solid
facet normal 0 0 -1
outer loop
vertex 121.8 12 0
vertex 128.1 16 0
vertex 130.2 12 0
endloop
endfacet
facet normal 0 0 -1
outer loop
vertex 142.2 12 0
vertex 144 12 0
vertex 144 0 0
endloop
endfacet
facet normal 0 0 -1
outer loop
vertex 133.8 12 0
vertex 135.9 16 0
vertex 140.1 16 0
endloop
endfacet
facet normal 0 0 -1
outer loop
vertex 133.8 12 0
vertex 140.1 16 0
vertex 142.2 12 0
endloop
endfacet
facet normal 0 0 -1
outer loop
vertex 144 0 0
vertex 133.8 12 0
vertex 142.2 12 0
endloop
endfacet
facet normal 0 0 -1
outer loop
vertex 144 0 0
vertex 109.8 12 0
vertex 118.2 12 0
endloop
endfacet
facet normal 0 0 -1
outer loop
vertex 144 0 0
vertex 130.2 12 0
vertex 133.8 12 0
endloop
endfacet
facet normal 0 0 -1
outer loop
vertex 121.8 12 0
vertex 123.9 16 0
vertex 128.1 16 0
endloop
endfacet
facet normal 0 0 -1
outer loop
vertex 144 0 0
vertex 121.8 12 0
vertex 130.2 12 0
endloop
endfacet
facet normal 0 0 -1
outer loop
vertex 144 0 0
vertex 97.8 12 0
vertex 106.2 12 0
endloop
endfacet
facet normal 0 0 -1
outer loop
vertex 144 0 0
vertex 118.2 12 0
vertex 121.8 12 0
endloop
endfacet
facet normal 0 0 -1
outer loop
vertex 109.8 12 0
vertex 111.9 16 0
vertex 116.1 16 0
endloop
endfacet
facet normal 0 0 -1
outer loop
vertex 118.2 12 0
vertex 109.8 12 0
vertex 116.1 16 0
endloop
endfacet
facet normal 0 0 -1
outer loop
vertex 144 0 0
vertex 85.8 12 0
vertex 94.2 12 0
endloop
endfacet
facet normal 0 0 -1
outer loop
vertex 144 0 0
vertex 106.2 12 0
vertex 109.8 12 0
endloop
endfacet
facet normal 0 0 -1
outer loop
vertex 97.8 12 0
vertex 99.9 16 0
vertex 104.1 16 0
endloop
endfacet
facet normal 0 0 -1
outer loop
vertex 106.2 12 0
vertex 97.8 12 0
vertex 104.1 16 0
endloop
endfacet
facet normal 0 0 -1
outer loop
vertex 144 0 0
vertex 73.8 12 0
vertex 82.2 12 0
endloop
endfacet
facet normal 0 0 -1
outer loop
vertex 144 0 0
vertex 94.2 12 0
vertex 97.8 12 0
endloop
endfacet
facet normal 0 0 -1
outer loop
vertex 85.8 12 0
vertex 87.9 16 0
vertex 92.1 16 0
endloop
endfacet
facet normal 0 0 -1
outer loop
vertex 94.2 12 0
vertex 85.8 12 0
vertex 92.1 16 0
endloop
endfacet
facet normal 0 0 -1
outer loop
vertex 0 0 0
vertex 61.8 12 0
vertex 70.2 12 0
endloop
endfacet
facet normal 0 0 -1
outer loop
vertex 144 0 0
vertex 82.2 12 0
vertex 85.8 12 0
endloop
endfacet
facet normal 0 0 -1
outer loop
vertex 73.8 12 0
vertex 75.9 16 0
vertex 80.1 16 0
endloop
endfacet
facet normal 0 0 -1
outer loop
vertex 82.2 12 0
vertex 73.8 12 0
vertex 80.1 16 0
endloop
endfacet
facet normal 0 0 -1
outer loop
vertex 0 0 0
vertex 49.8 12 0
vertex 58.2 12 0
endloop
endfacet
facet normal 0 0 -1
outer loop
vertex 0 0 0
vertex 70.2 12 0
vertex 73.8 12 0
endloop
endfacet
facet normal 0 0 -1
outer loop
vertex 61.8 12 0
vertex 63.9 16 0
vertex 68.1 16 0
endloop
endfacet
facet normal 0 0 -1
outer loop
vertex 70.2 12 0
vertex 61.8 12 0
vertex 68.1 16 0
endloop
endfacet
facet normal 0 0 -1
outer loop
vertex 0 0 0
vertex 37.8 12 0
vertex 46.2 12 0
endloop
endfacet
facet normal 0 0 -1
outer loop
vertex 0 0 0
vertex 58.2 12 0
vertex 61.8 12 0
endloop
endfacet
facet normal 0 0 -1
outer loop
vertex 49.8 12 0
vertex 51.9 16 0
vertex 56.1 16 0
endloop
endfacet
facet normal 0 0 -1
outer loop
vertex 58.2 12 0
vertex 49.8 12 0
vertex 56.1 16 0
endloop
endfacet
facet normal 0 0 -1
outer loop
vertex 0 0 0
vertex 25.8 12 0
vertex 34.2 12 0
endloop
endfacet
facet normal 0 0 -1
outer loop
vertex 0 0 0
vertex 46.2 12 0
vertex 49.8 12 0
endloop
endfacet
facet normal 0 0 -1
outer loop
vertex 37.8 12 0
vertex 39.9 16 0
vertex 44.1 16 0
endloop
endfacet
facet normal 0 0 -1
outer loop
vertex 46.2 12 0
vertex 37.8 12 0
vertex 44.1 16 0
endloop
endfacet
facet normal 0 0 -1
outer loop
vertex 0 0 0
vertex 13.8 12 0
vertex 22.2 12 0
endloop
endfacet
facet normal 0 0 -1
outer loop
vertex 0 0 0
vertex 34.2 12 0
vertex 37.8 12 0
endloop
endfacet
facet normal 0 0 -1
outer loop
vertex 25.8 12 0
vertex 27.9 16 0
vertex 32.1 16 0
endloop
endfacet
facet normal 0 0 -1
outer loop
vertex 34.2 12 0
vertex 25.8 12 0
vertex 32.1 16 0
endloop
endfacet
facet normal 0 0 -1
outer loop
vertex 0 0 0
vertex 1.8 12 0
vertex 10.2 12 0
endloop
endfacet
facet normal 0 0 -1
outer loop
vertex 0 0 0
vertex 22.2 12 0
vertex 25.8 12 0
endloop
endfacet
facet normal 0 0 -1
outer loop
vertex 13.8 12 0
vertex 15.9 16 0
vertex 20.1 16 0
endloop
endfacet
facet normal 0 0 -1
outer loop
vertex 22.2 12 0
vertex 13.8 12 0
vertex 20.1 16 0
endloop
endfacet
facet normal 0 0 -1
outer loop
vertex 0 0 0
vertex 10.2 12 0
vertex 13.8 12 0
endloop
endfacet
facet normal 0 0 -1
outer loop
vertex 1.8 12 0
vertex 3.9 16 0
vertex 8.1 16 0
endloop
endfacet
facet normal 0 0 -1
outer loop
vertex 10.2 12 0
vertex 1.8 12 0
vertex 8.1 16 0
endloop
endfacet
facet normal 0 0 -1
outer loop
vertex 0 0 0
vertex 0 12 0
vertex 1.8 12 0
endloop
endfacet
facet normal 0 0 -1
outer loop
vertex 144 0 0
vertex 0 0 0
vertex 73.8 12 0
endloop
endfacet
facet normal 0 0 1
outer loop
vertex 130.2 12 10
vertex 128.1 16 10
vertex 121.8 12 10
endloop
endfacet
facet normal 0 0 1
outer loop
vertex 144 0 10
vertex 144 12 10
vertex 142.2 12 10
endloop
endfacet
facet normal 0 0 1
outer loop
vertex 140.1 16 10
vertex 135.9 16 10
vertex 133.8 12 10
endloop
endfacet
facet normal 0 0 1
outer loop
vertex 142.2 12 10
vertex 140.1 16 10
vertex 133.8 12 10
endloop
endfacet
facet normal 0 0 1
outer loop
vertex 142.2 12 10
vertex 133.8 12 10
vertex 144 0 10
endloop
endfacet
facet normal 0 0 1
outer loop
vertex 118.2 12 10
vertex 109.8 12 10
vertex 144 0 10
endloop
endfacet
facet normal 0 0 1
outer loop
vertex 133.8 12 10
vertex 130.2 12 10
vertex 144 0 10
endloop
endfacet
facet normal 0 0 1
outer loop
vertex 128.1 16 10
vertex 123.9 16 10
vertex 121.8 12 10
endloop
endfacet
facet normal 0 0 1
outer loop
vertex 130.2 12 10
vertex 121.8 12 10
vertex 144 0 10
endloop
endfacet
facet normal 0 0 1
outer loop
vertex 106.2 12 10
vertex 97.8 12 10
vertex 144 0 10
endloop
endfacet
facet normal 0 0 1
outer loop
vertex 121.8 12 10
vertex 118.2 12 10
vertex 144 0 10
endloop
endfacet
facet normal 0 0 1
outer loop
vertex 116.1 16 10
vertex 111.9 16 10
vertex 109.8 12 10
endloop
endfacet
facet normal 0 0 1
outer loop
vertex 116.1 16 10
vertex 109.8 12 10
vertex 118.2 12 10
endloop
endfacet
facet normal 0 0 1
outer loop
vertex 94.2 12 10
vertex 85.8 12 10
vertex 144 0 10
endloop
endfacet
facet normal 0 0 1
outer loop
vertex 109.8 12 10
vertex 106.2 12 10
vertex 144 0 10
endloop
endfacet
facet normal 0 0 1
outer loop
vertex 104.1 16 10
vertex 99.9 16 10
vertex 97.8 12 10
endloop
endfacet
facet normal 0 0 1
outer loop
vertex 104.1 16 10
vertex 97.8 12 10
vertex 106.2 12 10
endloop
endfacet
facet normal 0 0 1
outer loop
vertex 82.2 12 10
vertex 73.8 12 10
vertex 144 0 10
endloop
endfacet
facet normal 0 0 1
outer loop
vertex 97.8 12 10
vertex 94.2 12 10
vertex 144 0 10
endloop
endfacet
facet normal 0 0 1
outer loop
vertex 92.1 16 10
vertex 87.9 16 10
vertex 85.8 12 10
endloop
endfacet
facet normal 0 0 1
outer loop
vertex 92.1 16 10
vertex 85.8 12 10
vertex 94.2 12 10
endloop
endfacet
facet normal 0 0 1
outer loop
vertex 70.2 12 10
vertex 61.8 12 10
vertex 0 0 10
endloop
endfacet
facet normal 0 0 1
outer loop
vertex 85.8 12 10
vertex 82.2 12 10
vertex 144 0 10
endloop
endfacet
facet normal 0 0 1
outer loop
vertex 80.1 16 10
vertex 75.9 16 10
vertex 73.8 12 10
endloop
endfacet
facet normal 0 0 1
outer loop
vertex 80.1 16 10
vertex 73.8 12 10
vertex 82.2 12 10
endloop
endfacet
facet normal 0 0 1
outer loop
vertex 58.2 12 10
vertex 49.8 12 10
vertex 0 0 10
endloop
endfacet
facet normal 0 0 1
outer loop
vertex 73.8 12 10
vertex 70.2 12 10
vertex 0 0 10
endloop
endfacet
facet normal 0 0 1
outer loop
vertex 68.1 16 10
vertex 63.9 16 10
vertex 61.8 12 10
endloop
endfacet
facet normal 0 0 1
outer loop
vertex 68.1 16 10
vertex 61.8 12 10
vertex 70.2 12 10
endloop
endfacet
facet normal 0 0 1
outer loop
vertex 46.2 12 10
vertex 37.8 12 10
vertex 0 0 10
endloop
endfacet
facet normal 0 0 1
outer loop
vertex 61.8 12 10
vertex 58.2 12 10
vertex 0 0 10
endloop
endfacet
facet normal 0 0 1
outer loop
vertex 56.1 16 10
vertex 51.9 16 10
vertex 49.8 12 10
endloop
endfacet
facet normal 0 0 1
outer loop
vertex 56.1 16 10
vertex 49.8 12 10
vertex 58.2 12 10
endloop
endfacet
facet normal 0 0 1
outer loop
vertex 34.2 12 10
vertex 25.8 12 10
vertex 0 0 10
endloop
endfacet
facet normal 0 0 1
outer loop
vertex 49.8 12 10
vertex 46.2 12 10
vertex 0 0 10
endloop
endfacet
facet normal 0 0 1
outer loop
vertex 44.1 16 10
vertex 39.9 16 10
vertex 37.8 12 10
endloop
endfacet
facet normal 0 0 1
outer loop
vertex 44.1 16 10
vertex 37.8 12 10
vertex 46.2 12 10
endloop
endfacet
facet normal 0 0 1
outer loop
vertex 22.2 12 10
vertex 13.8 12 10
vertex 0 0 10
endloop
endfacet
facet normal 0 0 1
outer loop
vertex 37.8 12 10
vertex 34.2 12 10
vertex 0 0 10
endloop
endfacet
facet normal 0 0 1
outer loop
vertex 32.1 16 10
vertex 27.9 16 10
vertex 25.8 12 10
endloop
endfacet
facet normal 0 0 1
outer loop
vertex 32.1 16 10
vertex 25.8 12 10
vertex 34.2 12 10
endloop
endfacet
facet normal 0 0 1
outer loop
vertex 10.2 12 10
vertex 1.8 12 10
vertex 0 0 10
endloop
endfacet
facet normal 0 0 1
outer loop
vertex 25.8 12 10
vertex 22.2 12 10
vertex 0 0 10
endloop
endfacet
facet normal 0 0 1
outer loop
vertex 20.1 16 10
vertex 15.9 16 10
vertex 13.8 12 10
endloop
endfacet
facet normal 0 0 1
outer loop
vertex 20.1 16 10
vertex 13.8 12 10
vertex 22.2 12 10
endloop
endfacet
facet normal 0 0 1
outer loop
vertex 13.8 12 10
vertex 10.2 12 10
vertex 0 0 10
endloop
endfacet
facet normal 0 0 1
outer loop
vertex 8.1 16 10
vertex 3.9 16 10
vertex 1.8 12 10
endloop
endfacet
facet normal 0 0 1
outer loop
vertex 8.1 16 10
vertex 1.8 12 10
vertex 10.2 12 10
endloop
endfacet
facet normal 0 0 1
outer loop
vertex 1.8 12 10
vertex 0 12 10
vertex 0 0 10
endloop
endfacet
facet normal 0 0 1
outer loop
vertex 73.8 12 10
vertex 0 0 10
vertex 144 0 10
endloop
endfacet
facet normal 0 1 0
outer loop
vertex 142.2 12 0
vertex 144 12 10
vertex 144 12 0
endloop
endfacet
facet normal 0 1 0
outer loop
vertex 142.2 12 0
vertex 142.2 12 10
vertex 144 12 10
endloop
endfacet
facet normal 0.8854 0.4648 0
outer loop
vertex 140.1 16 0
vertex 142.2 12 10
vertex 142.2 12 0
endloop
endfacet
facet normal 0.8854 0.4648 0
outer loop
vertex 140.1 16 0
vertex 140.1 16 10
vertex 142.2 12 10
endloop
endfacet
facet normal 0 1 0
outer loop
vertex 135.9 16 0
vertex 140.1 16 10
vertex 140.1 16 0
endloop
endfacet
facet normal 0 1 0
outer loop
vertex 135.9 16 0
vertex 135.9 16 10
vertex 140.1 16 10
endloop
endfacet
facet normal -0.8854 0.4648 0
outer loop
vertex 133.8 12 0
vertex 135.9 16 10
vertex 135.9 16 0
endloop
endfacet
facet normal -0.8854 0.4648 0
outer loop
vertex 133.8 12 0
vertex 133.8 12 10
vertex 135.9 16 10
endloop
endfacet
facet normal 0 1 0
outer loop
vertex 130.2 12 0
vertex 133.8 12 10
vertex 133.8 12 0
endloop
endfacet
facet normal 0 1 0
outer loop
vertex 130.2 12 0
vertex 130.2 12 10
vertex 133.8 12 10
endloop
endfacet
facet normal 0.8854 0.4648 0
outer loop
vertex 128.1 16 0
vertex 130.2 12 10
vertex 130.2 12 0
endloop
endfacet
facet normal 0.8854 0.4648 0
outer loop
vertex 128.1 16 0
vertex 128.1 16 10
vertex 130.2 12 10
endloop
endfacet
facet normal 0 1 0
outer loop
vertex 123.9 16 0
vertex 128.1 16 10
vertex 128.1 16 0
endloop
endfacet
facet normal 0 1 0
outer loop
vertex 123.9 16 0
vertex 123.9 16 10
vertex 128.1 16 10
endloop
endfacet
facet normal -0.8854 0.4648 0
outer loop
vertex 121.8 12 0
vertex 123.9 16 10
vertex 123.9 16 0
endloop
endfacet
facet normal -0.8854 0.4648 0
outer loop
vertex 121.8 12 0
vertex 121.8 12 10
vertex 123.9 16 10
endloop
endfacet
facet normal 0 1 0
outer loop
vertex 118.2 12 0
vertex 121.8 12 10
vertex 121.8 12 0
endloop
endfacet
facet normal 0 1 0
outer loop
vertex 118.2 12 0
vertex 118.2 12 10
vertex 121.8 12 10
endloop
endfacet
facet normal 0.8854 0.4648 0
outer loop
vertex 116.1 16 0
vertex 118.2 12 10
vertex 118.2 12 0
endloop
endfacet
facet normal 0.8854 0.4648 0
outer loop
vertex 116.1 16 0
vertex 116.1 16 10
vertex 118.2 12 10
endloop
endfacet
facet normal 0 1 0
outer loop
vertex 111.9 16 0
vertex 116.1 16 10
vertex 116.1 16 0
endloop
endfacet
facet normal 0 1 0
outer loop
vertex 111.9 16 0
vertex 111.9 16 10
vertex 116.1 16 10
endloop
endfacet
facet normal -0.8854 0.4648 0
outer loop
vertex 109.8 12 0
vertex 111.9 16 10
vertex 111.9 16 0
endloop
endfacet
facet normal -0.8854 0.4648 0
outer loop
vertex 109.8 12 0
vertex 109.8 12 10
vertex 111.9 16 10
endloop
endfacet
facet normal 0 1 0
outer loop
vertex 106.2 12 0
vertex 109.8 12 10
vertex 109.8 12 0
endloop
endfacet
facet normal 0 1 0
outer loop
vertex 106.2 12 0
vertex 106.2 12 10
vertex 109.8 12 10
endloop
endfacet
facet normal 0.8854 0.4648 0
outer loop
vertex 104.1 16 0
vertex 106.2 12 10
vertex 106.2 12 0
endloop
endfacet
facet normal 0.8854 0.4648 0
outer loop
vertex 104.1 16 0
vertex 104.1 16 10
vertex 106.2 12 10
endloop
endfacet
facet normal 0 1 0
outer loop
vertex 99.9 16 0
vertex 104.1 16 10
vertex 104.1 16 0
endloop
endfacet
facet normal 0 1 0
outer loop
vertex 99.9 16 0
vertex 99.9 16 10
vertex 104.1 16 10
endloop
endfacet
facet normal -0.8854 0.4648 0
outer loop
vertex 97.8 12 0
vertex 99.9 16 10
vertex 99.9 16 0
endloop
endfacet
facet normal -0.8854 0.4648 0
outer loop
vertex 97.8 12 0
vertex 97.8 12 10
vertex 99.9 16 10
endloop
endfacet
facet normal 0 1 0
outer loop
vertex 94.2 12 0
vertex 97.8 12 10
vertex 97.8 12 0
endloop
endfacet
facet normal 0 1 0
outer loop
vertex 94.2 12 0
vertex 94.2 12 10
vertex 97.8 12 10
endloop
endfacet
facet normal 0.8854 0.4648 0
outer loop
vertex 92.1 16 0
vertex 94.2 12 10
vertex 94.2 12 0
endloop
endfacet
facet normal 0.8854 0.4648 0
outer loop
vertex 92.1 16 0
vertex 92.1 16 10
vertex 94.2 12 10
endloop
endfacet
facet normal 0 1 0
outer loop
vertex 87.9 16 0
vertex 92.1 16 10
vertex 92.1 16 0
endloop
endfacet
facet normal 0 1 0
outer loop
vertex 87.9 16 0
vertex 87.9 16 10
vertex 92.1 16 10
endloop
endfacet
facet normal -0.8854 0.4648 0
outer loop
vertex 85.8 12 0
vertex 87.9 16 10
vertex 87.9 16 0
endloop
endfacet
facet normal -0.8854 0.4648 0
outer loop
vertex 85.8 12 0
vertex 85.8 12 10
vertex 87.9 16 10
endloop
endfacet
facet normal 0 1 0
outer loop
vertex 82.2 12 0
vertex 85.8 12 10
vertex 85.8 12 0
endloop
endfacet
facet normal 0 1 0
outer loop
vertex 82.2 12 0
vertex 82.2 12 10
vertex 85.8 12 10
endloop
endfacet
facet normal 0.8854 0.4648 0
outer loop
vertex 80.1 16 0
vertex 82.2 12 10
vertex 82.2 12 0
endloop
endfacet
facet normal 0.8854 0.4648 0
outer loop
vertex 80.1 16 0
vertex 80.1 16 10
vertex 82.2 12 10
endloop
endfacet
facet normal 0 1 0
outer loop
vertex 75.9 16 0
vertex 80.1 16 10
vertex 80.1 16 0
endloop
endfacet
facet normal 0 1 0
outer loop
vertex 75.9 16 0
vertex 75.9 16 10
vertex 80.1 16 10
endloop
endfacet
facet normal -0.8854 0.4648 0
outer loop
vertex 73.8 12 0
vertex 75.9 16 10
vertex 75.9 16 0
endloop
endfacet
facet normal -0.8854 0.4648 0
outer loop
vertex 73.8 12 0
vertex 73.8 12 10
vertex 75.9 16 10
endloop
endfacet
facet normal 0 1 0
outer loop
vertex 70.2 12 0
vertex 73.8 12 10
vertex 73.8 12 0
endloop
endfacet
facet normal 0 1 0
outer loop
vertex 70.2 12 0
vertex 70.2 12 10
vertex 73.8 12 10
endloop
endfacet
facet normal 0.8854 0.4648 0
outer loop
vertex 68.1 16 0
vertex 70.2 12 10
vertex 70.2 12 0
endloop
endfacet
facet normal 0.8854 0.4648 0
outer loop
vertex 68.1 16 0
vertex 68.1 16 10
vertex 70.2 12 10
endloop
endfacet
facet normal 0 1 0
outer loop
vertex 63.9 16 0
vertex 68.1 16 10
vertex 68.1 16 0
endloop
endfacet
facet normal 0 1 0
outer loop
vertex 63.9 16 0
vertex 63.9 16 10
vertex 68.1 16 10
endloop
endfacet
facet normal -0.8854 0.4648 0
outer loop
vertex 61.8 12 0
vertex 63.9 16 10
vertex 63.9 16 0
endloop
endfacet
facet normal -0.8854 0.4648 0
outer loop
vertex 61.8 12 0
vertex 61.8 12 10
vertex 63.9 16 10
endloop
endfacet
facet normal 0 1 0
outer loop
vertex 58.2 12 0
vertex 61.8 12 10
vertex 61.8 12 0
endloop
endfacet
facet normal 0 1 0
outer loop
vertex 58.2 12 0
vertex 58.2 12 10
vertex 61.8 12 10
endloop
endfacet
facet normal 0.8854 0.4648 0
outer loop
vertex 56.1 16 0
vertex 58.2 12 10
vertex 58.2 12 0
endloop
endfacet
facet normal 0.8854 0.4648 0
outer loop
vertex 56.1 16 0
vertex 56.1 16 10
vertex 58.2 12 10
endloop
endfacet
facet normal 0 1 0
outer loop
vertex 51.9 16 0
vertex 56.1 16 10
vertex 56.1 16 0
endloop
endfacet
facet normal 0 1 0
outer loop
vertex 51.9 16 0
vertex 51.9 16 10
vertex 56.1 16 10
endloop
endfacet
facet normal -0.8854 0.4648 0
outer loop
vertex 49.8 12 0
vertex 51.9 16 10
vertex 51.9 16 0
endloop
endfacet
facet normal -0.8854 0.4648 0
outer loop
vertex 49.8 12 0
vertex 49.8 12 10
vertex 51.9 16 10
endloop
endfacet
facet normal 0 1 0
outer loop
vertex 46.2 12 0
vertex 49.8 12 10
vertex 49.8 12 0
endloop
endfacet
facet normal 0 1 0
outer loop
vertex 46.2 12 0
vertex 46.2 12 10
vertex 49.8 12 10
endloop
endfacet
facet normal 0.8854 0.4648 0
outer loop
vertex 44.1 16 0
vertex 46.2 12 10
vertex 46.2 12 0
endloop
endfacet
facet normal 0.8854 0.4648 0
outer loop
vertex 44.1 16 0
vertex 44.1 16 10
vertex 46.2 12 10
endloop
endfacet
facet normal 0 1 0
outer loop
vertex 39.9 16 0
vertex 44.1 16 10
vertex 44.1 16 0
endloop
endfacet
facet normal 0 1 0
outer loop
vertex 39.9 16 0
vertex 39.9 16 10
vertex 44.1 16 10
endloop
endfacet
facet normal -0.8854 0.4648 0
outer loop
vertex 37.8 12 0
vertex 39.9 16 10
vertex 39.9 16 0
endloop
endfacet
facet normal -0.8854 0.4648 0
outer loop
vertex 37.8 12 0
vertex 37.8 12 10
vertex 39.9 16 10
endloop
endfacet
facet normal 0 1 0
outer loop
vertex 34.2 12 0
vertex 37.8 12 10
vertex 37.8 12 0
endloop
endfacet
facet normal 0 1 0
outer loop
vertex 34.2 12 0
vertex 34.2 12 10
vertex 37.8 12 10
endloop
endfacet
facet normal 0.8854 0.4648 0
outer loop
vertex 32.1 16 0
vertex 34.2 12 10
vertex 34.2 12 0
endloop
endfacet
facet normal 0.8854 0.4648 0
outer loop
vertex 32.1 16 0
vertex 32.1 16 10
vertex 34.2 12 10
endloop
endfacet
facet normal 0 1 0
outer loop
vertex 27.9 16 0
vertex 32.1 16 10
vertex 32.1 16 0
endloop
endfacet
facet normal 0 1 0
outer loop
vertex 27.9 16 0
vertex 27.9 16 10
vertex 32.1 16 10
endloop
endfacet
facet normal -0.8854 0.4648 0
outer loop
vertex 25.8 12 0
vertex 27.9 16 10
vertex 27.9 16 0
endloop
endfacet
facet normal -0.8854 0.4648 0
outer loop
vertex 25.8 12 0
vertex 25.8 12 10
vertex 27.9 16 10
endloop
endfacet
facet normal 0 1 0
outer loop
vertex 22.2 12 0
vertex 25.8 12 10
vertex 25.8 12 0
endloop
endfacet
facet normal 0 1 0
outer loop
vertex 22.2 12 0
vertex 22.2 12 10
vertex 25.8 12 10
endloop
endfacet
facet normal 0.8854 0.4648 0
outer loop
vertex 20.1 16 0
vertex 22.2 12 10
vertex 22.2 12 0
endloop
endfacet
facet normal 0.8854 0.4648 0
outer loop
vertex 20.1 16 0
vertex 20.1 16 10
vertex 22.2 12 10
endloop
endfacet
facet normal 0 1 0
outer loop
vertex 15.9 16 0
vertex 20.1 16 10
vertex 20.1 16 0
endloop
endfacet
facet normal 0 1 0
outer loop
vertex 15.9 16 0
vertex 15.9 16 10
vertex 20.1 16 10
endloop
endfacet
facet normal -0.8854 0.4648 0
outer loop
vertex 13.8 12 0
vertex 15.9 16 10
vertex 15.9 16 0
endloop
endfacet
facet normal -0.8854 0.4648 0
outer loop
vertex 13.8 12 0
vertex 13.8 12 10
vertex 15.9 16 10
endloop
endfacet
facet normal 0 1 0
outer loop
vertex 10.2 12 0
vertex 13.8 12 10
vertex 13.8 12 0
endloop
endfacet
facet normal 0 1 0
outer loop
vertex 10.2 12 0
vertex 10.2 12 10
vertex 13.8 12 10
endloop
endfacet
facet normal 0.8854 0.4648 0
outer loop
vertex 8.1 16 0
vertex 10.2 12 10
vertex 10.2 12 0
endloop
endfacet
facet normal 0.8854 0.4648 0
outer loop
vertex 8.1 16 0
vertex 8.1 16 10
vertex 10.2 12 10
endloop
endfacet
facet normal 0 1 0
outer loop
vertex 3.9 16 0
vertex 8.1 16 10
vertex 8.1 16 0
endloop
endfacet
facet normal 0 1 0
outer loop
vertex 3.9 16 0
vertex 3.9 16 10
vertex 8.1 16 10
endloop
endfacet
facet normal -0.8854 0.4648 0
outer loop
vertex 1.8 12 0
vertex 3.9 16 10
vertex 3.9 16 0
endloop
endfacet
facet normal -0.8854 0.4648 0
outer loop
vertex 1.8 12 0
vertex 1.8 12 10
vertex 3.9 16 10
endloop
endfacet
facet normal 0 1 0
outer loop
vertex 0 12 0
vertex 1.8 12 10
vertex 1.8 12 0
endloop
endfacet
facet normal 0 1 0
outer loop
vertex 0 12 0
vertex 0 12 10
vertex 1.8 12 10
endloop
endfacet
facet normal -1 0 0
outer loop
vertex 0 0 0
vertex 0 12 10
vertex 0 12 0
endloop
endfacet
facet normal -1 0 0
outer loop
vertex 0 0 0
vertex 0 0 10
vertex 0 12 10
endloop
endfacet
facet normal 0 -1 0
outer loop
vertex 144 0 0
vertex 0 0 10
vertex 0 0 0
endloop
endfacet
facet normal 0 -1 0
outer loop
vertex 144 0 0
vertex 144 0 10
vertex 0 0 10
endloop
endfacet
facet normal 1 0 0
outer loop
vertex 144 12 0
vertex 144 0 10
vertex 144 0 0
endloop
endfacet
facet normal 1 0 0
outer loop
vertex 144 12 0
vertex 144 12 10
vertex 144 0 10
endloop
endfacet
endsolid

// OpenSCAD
$fn = 32;

// ----------------------------------------------------------------------
// Gear rack: 12 teeth, pitch 12 mm
// ----------------------------------------------------------------------

// --- parameters (mm) ---
teeth = 12;               // number of teeth
pitch = 12;               // tooth pitch, X
root_w = 8.4;             // tooth width at the root
tip_w = 4.2;              // tooth width at the tip
base_h = 12;              // rack body height, Y
tooth_h = 4;              // tooth height above the body
plate_t = 10;             // rack width, Z (extrusion height)

rack_l = teeth * pitch;  // overall length
total_h = base_h + tooth_h;  // overall height

profile = [[0, 0], [144, 0], [144, 12], [142.2, 12], [140.1, 16], [135.9, 16], [133.8, 12], [130.2, 12], [128.1, 16], [123.9, 16], [121.8, 12], [118.2, 12], [116.1, 16], [111.9, 16], [109.8, 12], [106.2, 12], [104.1, 16], [99.9, 16], [97.8, 12], [94.2, 12], [92.1, 16], [87.9, 16], [85.8, 12], [82.2, 12], [80.1, 16], [75.9, 16], [73.8, 12], [70.2, 12], [68.1, 16], [63.9, 16], [61.8, 12], [58.2, 12], [56.1, 16], [51.9, 16], [49.8, 12], [46.2, 12], [44.1, 16], [39.9, 16], [37.8, 12], [34.2, 12], [32.1, 16], [27.9, 16], [25.8, 12], [22.2, 12], [20.1, 16], [15.9, 16], [13.8, 12], [10.2, 12], [8.1, 16], [3.9, 16], [1.8, 12], [0, 12]];  // primary outline, 52 points, counter clockwise

// --- the one profile operation ---
linear_extrude(height = plate_t) polygon(points = profile);
